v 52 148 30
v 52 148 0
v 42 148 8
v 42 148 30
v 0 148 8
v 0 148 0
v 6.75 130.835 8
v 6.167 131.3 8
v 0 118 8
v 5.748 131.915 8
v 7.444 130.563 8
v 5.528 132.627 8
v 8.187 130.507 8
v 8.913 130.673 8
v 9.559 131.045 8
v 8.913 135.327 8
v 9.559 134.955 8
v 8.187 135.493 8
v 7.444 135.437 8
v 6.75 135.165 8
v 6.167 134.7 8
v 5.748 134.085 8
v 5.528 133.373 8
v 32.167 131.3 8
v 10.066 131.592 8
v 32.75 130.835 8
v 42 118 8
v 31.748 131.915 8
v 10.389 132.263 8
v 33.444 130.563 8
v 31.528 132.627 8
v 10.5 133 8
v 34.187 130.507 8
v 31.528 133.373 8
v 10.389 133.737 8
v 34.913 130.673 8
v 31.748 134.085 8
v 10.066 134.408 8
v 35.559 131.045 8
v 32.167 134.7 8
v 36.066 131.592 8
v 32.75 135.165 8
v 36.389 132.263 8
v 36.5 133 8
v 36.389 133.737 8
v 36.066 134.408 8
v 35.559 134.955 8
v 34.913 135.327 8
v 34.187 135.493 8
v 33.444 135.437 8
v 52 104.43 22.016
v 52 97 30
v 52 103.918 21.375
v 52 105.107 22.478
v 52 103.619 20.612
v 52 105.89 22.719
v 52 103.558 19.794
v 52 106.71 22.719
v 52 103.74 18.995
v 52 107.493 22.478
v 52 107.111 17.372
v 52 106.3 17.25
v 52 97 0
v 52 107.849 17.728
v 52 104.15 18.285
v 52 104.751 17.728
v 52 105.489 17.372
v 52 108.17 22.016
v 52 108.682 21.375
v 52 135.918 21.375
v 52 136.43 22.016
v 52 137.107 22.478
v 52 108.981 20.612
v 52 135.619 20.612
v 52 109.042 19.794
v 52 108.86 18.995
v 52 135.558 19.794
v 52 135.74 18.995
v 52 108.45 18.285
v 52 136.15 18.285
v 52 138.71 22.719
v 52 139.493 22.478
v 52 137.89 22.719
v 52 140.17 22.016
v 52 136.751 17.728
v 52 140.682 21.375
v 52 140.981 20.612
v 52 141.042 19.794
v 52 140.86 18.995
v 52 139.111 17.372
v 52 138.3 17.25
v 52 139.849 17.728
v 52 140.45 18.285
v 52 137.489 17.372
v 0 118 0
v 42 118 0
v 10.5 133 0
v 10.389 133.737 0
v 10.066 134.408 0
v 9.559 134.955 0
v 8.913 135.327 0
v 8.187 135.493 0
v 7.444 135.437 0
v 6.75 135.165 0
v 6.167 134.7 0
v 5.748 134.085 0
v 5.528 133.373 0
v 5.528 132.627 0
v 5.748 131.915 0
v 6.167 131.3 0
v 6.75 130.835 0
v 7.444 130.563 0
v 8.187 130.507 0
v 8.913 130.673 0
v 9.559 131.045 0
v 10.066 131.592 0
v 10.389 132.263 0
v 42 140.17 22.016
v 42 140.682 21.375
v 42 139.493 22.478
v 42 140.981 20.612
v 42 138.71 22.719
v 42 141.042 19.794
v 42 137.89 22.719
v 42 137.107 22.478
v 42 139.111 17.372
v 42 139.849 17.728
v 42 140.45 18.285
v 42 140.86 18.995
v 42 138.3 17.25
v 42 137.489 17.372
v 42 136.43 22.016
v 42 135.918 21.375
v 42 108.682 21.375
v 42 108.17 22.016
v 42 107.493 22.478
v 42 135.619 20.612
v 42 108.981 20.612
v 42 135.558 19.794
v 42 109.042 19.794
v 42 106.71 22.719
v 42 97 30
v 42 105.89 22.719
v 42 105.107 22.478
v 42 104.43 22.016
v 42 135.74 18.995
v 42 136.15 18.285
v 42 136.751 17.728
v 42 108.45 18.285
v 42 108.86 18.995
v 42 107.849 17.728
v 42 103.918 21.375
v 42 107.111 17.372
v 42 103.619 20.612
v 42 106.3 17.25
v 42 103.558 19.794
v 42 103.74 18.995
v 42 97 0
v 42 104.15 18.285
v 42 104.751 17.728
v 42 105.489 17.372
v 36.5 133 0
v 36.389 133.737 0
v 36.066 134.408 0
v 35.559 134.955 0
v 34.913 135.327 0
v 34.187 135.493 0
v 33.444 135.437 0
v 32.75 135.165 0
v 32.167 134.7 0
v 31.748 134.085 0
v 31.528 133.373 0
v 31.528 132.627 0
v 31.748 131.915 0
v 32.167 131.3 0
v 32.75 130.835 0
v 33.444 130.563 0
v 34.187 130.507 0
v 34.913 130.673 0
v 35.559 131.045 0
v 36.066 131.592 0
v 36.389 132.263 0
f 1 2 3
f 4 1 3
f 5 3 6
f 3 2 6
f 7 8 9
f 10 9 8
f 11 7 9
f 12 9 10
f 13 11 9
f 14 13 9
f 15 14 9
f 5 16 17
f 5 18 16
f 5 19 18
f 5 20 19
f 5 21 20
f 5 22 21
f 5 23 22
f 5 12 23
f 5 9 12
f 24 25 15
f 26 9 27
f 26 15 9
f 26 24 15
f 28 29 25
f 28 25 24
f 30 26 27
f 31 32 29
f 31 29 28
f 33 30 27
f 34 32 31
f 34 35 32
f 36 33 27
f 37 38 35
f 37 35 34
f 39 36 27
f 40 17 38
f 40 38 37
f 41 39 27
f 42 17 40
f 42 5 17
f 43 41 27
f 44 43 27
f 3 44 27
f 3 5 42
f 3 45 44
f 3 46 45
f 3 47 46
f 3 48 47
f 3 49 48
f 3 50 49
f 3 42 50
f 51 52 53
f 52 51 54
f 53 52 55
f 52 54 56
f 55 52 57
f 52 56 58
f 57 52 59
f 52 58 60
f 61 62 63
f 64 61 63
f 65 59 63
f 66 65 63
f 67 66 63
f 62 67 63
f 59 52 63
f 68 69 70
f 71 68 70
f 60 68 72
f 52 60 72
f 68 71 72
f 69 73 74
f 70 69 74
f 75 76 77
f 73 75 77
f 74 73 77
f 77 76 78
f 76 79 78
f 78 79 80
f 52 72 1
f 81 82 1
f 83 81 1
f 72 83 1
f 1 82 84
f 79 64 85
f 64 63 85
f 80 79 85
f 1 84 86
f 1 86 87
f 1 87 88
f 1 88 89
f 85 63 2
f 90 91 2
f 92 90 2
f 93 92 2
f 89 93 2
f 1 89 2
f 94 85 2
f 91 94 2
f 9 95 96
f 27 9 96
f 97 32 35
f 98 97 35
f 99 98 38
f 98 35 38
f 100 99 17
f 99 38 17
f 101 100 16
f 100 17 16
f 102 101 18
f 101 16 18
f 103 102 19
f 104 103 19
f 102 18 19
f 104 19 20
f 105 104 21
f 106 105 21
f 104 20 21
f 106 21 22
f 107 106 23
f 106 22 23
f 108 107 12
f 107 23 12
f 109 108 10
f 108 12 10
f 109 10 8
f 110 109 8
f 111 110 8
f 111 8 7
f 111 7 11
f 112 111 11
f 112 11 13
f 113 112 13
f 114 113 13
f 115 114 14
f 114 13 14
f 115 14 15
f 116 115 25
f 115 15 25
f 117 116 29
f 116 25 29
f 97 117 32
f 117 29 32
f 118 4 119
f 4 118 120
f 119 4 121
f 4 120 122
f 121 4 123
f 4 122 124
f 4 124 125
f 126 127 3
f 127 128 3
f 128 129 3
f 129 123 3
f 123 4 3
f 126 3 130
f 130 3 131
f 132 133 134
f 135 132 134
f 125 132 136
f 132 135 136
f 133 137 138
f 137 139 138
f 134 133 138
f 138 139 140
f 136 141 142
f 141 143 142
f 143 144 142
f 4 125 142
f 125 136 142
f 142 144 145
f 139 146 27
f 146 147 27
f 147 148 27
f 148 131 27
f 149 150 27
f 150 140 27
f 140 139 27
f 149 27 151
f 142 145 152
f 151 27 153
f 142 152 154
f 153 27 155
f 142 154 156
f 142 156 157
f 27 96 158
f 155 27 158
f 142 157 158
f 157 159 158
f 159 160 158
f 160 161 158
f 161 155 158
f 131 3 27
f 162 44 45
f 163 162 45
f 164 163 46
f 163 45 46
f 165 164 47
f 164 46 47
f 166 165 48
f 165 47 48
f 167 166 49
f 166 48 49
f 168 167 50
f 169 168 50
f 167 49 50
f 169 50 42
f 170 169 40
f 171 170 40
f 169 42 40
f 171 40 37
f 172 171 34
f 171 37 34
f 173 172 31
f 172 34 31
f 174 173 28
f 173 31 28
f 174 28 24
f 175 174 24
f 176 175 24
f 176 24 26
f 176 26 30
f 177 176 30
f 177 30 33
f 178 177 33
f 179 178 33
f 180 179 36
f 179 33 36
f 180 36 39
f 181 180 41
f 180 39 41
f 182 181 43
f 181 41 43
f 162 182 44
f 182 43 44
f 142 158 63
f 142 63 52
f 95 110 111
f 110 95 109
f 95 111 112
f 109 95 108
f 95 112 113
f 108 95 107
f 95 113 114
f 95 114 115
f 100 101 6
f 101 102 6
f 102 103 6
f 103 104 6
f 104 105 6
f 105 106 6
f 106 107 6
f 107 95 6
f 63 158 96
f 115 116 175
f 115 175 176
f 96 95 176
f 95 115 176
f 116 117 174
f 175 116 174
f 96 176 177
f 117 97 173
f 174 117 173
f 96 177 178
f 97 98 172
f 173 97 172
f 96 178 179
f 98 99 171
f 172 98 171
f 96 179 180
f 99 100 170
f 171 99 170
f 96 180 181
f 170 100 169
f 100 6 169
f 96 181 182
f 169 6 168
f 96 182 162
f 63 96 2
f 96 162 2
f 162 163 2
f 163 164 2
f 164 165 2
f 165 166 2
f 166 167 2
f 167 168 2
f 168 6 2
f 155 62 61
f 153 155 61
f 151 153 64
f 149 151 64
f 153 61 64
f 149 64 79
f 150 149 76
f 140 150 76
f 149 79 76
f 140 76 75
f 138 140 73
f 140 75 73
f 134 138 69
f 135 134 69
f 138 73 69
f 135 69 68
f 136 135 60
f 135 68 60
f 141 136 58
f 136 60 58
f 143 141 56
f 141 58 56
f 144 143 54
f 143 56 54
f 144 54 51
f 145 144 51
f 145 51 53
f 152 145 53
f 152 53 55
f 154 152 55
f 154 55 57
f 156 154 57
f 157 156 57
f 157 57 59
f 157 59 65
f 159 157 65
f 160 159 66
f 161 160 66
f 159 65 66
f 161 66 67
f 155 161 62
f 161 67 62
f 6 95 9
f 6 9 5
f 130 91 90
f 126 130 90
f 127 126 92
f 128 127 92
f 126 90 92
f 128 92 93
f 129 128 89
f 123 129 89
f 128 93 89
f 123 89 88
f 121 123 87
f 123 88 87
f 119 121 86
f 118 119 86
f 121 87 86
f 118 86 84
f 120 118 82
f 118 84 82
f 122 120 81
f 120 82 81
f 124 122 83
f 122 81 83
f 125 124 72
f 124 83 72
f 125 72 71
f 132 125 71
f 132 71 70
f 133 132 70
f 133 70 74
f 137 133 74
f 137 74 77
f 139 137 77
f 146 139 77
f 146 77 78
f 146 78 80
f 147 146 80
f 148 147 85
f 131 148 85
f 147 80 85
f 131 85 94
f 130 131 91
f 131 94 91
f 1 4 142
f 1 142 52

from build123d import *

# Parameters (mm, degrees)
SKETCH1_W             = 42
SKETCH1_H             = 30
BOSS_EXTRUDE1_DEPTH   = 8
BOSS_EXTRUDE1_2_DEPTH = 8
BOSS_EXTRUDE2_DEPTH   = 30
SKETCH2_R             = 2.5
CUT_EXTRUDE1_DEPTH    = 8
SKETCH3_R             = 2.75
CUT_EXTRUDE2_DEPTH    = 10
SKETCH6_W             = 30
SKETCH6_H             = 97
CUT_EXTRUDE6_DEPTH    = 52


with BuildPart() as part:
    # Sketch1 → Boss-Extrude1 (new body)
    with BuildSketch(Plane.XY):
        with Locations((21, 133)):
            Rectangle(SKETCH1_W, SKETCH1_H)
    extrude(amount=BOSS_EXTRUDE1_DEPTH)



with BuildPart() as body_2:
    # Sketch1 → Boss-Extrude1 2 (new body)
    with BuildSketch(Plane.XY):
        with Locations((21, 15)):
            Rectangle(SKETCH1_W, SKETCH1_H)
    extrude(amount=BOSS_EXTRUDE1_2_DEPTH)


with BuildPart() as part_1:
    add(part.part)

    add(body_2.part)  # Boss-Extrude2 merges body 2
    # Sketch1<3> → Boss-Extrude2 (add)
    with BuildSketch(Plane.XY):
        Polygon((42, 30), (42, 0), (52, 0), (52, 148), (42, 148), (42, 118), align=None)
    extrude(amount=BOSS_EXTRUDE2_DEPTH)

    # Sketch2 → Cut-Extrude1 (cut)
    with BuildSketch(Plane.XY.offset(8)):
        with Locations((8, 133)):
            Circle(SKETCH2_R)
        with Locations((34, 133)):
            Circle(SKETCH2_R)
        with Locations((34, 15)):
            Circle(SKETCH2_R)
        with Locations((8, 15)):
            Circle(SKETCH2_R)
    extrude(amount=-CUT_EXTRUDE1_DEPTH, mode=Mode.SUBTRACT)

    # Sketch3 → Cut-Extrude2 (cut)
    with BuildSketch(Plane(origin=(52, 0, 0), x_dir=(0, 0, -1), z_dir=(1, 0, 0))):
        with Locations((-20, 138.3)):
            Circle(SKETCH3_R)
        with Locations((-20, 106.3)):
            Circle(SKETCH3_R)
        with Locations((-20, 41.2)):
            Circle(SKETCH3_R)
        with Locations((-20, 9.2)):
            Circle(SKETCH3_R)
    extrude(amount=-CUT_EXTRUDE2_DEPTH, mode=Mode.SUBTRACT)

    # Sketch6 → Cut-Extrude6 (cut)
    with BuildSketch(Plane.ZY):
        with Locations((15, 48.5)):
            Rectangle(SKETCH6_W, SKETCH6_H)
    extrude(amount=-CUT_EXTRUDE6_DEPTH, mode=Mode.SUBTRACT)


solid = part_1.part
